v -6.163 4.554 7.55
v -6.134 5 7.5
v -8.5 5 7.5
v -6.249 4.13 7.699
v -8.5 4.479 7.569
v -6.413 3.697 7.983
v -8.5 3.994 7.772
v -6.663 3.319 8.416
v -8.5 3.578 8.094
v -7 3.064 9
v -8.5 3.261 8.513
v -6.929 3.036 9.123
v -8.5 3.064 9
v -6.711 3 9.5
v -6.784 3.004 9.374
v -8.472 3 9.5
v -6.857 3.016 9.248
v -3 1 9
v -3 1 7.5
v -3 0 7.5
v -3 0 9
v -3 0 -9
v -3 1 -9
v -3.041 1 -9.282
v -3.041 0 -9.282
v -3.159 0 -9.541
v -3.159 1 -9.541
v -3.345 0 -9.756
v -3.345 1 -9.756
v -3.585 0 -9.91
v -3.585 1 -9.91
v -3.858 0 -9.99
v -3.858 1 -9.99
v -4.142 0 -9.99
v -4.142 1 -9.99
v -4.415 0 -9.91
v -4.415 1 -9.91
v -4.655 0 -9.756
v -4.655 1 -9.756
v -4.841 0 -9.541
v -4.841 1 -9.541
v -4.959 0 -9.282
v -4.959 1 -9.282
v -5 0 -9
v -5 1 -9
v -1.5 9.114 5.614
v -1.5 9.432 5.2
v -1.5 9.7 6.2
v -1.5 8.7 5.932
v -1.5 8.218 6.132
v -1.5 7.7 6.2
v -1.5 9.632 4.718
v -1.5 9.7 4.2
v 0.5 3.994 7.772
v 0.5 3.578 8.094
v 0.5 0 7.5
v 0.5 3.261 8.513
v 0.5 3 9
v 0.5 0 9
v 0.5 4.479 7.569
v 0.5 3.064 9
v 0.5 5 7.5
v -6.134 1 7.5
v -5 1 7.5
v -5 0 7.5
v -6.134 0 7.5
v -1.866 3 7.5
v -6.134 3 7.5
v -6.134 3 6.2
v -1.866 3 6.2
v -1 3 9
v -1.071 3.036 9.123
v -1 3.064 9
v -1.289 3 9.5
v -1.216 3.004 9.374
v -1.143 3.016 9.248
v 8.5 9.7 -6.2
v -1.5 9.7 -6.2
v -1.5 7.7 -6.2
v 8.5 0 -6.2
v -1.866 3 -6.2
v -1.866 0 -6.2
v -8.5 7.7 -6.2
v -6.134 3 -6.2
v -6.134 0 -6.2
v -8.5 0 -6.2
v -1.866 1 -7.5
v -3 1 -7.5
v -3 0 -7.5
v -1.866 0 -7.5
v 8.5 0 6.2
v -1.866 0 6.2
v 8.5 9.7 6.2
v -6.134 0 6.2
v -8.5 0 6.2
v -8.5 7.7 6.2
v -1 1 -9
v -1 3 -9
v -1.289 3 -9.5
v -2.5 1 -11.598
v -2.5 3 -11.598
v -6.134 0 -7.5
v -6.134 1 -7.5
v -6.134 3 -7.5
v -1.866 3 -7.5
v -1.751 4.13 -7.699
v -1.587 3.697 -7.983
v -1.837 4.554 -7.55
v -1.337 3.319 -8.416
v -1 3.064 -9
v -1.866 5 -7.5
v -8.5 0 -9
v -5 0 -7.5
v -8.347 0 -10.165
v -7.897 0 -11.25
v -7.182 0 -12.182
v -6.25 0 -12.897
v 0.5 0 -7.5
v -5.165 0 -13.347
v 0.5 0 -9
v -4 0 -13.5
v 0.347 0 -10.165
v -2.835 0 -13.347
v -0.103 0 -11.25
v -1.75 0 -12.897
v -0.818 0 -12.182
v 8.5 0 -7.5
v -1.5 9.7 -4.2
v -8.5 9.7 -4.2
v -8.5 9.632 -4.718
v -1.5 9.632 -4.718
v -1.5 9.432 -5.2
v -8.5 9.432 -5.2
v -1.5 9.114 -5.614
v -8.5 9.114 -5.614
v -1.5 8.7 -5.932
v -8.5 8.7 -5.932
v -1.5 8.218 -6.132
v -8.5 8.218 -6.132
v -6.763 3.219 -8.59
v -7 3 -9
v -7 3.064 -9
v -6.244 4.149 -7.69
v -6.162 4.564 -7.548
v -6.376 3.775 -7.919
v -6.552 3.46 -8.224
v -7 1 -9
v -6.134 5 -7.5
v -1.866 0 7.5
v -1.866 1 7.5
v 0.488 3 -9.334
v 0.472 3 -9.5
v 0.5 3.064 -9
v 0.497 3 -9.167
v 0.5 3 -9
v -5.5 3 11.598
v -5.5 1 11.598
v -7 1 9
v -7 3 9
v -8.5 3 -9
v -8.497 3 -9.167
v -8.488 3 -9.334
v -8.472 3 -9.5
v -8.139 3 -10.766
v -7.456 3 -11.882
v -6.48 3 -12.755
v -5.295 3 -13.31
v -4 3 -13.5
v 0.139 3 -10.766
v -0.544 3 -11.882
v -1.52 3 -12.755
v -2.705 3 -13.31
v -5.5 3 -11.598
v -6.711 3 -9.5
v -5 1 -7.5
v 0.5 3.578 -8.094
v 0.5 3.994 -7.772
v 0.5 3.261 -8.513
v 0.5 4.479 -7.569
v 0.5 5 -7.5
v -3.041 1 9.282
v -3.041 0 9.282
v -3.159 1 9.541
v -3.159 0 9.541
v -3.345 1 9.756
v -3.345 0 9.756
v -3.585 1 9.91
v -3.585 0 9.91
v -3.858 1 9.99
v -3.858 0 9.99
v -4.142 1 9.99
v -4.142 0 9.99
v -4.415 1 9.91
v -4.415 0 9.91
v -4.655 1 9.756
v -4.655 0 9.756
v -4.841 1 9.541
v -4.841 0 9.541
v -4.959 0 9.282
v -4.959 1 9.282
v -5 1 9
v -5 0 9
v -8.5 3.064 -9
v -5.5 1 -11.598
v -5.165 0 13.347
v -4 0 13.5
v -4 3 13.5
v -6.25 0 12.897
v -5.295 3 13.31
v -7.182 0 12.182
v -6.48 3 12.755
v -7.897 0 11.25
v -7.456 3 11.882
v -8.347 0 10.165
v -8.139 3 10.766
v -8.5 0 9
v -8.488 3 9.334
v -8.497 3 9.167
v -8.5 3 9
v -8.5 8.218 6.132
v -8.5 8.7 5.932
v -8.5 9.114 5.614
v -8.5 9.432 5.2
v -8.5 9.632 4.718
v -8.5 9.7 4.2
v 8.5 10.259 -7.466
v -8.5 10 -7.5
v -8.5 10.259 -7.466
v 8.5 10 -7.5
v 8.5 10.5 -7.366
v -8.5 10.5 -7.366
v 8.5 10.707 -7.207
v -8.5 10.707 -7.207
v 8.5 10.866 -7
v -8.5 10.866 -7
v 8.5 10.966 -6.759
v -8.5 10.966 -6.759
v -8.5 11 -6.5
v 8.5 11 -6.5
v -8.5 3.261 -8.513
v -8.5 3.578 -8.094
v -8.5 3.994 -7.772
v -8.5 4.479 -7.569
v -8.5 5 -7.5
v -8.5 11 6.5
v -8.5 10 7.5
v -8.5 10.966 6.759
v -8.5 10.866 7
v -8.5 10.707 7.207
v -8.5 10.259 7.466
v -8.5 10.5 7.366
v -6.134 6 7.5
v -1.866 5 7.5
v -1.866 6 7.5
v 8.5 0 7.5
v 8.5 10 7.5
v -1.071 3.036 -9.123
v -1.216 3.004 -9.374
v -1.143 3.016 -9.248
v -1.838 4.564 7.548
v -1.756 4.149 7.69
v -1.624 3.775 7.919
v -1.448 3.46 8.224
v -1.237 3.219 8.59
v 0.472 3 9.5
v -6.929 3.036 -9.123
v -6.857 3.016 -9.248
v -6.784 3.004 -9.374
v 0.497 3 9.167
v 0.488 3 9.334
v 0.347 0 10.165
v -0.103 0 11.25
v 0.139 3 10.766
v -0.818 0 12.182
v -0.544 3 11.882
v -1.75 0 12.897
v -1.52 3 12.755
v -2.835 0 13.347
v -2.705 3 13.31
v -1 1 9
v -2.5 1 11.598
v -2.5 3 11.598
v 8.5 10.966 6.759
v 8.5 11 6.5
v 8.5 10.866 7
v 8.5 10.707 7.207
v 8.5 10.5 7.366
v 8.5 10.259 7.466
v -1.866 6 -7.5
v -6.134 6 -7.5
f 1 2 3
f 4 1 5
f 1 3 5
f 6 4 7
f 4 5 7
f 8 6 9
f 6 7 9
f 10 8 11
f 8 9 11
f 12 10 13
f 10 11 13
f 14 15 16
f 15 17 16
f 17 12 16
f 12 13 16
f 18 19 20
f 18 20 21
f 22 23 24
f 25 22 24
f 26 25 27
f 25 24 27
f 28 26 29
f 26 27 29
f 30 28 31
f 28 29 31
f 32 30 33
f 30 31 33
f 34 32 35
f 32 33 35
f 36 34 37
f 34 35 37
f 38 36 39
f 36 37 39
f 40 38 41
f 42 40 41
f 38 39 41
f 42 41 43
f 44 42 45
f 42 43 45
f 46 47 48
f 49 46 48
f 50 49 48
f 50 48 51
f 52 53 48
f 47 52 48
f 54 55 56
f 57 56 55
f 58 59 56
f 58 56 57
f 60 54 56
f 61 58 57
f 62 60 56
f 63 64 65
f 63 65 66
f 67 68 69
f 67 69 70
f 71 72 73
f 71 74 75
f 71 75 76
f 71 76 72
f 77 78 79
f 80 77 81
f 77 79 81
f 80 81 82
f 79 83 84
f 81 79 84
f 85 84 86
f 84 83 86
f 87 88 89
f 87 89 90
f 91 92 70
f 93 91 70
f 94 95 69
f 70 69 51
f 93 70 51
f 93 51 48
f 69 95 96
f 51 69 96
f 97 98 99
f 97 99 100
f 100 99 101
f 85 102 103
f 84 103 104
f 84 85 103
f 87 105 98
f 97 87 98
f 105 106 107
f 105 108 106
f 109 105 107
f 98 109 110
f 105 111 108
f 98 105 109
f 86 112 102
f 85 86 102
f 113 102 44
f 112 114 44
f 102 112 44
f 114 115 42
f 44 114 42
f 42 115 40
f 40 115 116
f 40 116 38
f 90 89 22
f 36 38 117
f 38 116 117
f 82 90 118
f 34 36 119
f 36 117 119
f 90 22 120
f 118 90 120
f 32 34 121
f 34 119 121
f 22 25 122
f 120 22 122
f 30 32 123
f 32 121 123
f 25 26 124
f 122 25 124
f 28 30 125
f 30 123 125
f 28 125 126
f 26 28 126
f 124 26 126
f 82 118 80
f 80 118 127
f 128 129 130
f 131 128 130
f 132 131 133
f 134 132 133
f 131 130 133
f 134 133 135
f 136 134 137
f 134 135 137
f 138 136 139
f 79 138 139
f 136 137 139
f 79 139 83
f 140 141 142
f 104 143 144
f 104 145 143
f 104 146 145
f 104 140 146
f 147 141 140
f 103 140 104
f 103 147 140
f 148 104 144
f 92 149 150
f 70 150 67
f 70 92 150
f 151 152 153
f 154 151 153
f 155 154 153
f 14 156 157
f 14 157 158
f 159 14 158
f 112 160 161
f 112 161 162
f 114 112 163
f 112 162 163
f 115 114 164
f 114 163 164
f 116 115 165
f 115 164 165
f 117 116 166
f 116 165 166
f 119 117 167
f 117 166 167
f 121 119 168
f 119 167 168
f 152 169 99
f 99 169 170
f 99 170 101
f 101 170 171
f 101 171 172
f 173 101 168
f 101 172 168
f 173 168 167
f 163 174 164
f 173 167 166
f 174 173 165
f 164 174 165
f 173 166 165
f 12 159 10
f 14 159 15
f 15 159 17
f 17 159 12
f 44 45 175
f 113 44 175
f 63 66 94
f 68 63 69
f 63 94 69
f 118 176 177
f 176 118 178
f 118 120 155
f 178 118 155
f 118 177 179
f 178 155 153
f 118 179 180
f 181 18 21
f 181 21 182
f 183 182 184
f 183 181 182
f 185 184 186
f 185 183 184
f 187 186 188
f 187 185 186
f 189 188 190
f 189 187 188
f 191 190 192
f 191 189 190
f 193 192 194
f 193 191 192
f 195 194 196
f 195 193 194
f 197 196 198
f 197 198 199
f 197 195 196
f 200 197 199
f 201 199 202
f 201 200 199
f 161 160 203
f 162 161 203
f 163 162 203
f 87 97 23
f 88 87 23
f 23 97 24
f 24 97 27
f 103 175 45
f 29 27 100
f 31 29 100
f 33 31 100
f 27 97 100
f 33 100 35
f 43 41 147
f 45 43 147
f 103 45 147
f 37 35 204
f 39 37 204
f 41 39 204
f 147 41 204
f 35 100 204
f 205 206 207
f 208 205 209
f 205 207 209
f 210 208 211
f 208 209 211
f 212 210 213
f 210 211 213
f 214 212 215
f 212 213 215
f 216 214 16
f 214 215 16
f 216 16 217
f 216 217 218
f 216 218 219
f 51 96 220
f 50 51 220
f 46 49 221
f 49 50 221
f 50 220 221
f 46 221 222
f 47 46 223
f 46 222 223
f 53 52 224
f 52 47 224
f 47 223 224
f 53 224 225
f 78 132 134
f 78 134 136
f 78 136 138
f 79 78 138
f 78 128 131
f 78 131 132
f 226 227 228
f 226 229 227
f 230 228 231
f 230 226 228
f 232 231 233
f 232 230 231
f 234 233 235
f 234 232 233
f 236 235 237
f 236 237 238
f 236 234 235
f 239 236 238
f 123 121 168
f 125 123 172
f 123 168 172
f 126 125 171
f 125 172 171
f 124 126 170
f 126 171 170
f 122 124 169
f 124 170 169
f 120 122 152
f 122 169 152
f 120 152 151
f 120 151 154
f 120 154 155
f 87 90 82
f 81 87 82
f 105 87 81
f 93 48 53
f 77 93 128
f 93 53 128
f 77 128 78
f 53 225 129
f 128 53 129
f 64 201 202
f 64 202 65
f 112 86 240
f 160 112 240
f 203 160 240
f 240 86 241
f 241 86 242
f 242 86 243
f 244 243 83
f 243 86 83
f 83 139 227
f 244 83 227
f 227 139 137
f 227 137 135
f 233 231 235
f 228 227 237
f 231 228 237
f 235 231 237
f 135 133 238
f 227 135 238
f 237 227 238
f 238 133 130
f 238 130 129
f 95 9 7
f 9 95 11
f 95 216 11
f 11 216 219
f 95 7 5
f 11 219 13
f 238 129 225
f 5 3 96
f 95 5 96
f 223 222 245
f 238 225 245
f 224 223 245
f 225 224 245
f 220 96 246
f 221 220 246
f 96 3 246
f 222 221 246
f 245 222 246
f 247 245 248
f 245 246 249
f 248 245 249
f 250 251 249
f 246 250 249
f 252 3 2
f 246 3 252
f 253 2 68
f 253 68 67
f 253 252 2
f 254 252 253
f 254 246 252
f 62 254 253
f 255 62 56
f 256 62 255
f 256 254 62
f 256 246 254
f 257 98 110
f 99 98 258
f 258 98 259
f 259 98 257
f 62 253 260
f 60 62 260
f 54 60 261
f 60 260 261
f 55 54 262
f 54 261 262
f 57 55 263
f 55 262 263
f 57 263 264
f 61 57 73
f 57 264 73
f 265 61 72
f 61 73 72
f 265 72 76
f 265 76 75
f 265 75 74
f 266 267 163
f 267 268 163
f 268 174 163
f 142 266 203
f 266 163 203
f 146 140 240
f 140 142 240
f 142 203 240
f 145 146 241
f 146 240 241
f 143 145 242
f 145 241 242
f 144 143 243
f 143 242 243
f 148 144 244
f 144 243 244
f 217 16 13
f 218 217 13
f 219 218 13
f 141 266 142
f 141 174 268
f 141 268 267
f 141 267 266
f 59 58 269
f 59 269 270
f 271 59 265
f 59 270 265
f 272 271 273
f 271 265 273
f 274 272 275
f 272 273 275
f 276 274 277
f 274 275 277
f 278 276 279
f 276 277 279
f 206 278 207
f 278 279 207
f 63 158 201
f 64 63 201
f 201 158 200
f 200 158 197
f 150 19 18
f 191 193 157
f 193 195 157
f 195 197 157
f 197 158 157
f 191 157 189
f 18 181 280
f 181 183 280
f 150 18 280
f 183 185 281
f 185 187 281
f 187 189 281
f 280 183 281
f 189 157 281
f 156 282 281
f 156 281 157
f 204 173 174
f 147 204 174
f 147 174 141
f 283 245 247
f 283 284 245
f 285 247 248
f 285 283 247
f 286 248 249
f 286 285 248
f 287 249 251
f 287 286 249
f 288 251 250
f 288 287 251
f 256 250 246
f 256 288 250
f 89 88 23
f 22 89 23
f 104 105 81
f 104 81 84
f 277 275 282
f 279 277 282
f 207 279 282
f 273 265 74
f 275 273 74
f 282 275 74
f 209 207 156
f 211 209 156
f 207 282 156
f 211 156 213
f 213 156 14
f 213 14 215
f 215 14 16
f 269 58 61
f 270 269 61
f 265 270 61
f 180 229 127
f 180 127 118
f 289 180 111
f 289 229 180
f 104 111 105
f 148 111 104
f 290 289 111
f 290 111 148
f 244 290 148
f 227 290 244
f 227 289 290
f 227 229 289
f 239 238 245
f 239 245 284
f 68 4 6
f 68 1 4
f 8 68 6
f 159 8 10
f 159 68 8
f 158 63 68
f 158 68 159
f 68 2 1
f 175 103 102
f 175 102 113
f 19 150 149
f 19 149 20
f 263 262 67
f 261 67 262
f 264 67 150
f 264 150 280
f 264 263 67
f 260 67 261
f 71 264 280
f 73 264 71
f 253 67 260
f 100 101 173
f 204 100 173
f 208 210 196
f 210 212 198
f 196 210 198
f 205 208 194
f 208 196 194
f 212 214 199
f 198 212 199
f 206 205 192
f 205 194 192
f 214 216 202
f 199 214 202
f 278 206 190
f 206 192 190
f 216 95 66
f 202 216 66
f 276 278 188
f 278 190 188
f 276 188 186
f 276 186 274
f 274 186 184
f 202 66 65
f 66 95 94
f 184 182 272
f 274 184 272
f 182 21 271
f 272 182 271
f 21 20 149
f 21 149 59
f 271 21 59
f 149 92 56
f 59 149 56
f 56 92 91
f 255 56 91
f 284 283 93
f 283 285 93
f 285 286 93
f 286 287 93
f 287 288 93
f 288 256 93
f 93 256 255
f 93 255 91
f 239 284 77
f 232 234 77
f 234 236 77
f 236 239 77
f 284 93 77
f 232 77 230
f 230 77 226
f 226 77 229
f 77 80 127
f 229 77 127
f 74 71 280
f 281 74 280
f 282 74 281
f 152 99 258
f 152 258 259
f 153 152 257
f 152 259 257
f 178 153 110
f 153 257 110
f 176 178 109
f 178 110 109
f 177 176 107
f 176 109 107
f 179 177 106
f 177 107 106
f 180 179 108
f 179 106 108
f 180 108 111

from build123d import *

# Parameters (mm, degrees)
CROQUIS1_W              = 17
CROQUIS1_H              = 27
SALIENTE_EXTRUIR1_DEPTH = 11
CROQUIS2_W              = 17
CROQUIS2_H              = 6
CORTAR_EXTRUIR1_DEPTH   = 6
CROQUIS3_W              = 8
CROQUIS3_H              = 5
CORTAR_EXTRUIR2_DEPTH   = 6
CROQUIS4_W              = 8
CROQUIS4_H              = 5
CORTAR_EXTRUIR3_DEPTH   = 6
CORTAR_EXTRUIR8_DEPTH   = 6
CORTAR_EXTRUIR16_DEPTH  = 2
CORTAR_EXTRUIR17_DEPTH  = 2
CORTAR_EXTRUIR18_DEPTH  = 2
REDONDEO5_START         = -1
REDONDEO5_DEPTH         = 1.04658
REDONDEO5_START_2       = -7.65058
REDONDEO5_2_DEPTH       = 0.804
REDONDEO5_START_3       = -1.866025504
REDONDEO5_3_DEPTH       = 2.366025504
REDONDEO5_START_4       = -8.5
REDONDEO5_4_DEPTH       = 0.84942
REDONDEO5_START_5       = -6.84658
REDONDEO5_5_DEPTH       = 0.712605404
REDONDEO5_START_6       = 3
REDONDEO5_6_DEPTH       = 3
CORTAR_EXTRUIR19_DEPTH  = 17
CORTAR_EXTRUIR20_START  = -10
CORTAR_EXTRUIR20_DEPTH  = 10
REDONDEO6_R             = 1
CORTAR_EXTRUIR21_DEPTH  = 1
CORTAR_EXTRUIR22_DEPTH  = 1
CORTAR_EXTRUIR26_DEPTH  = 1.3
CROQUIS17_W             = 4.267949192
CROQUIS17_H             = 2
CORTAR_EXTRUIR27_DEPTH  = 1.3
CROQUIS19_W             = 4.267949192
CROQUIS19_H             = 1
CORTAR_EXTRUIR28_DEPTH  = 1.3
CROQUIS20_W             = 4.267949192
CROQUIS20_H             = 1
CORTAR_EXTRUIR29_DEPTH  = 1.3


with BuildPart() as part:
    # Croquis1 → Saliente-Extruir1 (new body)
    with BuildSketch(Plane(origin=(0, 0, 0), x_dir=(1, 0, 0), z_dir=(0, 1, 0))):
        Rectangle(CROQUIS1_W, CROQUIS1_H)
    extrude(amount=SALIENTE_EXTRUIR1_DEPTH)

    # Croquis2 → Cortar-Extruir1 (cut)
    with BuildSketch(Plane(origin=(0, 11, 0), x_dir=(1, 0, 0), z_dir=(0, 1, 0))):
        with Locations((0, 10.5)):
            Rectangle(CROQUIS2_W, CROQUIS2_H)
        with Locations((0, -10.5)):
            Rectangle(CROQUIS2_W, CROQUIS2_H)
    extrude(amount=-CORTAR_EXTRUIR1_DEPTH, mode=Mode.SUBTRACT)

    # Croquis3 → Cortar-Extruir2 (cut)
    with BuildSketch(Plane.XY.offset(13.5)):
        with Locations((4.5, 2.5)):
            Rectangle(CROQUIS3_W, CROQUIS3_H)
    extrude(amount=-CORTAR_EXTRUIR2_DEPTH, mode=Mode.SUBTRACT)

    # Croquis4 → Cortar-Extruir3 (cut)
    with BuildSketch(Plane(origin=(0, 0, -13.5), x_dir=(-1, 0, 0), z_dir=(0, 0, -1))):
        with Locations((-4.5, 2.5)):
            Rectangle(CROQUIS4_W, CROQUIS4_H)
    extrude(amount=-CORTAR_EXTRUIR3_DEPTH, mode=Mode.SUBTRACT)

    # Croquis5 → Cortar-Extruir8 (cut)
    with BuildSketch(Plane(origin=(0, 5, 0), x_dir=(1, 0, 0), z_dir=(0, 1, 0))):
        with BuildLine():
            Line((-8.5, 13.5), (-8.5, 9))
            ThreePointArc((-8.5, 9), (-7.181980515, 12.181980515), (-4, 13.5))
            Line((-4, 13.5), (-8.5, 13.5))
        make_face()
        with BuildLine():
            Line((0.5, 13.5), (-4, 13.5))
            ThreePointArc((-4, 13.5), (-0.818019485, 12.181980515), (0.5, 9))
            Line((0.5, 9), (0.5, 13.5))
        make_face()
        with BuildLine():
            ThreePointArc((-4, -13.5), (-7.181980515, -12.181980515), (-8.5, -9))
            Line((-8.5, -9), (-8.5, -13.5))
            Line((-8.5, -13.5), (-4, -13.5))
        make_face()
        with BuildLine():
            ThreePointArc((0.5, -9), (-0.818019485, -12.181980515), (-4, -13.5))
            Line((-4, -13.5), (0.5, -13.5))
            Line((0.5, -13.5), (0.5, -9))
        make_face()
    extrude(amount=-CORTAR_EXTRUIR8_DEPTH, mode=Mode.SUBTRACT)

    # Croquis7 → Cortar-Extruir16 (cut)
    with BuildSketch(Plane(origin=(0, 5, 0), x_dir=(1, 0, 0), z_dir=(0, 1, 0))):
        with BuildLine():
            Line((-8.5, 7.5), (-8.5, 9))
            ThreePointArc((-8.5, 9), (-4, 13.5), (0.5, 9))
            Line((0.5, 9), (0.5, 7.5))
            Line((0.5, 7.5), (-8.5, 7.5))
        make_face()
        with BuildLine():
            Line((-8.5, -9), (-8.5, -7.5))
            Line((-8.5, -7.5), (0.5, -7.5))
            Line((0.5, -7.5), (0.5, -9))
            ThreePointArc((0.5, -9), (-4, -13.5), (-8.5, -9))
        make_face()
    extrude(amount=-CORTAR_EXTRUIR16_DEPTH, mode=Mode.SUBTRACT)

    # Croquis10 → Cortar-Extruir17 (cut)
    with BuildSketch(Plane(origin=(0, 3, 0), x_dir=(1, 0, 0), z_dir=(0, 1, 0))):
        Polygon((-6.133974596, 7.5), (-1.866025404, 7.5), (-1, 9), (-2.5, 11.598076211), (-5.5, 11.598076211), (-7, 9), align=None)
    extrude(amount=-CORTAR_EXTRUIR17_DEPTH, mode=Mode.SUBTRACT)

    # Croquis11 → Cortar-Extruir18 (cut)
    with BuildSketch(Plane(origin=(0, 3, 0), x_dir=(1, 0, 0), z_dir=(0, 1, 0))):
        Polygon((-6.133974596, -7.5), (-1.866025404, -7.5), (-1, -9), (-2.5, -11.598076211), (-5.5, -11.598076211), (-7, -9), align=None)
    extrude(amount=-CORTAR_EXTRUIR18_DEPTH, mode=Mode.SUBTRACT)

    # Redondeo5: read off the stored shape, not the designer's step
    # Redondeo5 outline → Redondeo5 (add)
    with BuildSketch(Plane.YZ.offset(REDONDEO5_START)):
        with BuildLine():
            Line((3, 7.5), (5, 7.5))
            ThreePointArc((5, 7.5), (3.585786438, 8.085786438), (3, 9.5))
            Line((3, 9.5), (3, 7.5))
        make_face()
        with BuildLine():
            ThreePointArc((3, -9.5), (3.585786438, -8.085786438), (5, -7.5))
            Line((5, -7.5), (3, -7.5))
            Line((3, -7.5), (3, -9.5))
        make_face()
    extrude(amount=REDONDEO5_DEPTH)

    # Redondeo5 2 outline → Redondeo5 2 (add)
    with BuildSketch(Plane.YZ.offset(REDONDEO5_START_2)):
        with BuildLine():
            Line((3, 7.5), (5, 7.5))
            ThreePointArc((5, 7.5), (3.585786438, 8.085786438), (3, 9.5))
            Line((3, 9.5), (3, 7.5))
        make_face()
        with BuildLine():
            ThreePointArc((3, -9.5), (3.585786438, -8.085786438), (5, -7.5))
            Line((5, -7.5), (3, -7.5))
            Line((3, -7.5), (3, -9.5))
        make_face()
    extrude(amount=REDONDEO5_2_DEPTH)

    # Redondeo5 3 outline → Redondeo5 3 (add)
    with BuildSketch(Plane.YZ.offset(REDONDEO5_START_3)):
        with BuildLine():
            Line((3, 7.5), (5, 7.5))
            ThreePointArc((5, 7.5), (3.585786438, 8.085786438), (3, 9.5))
            Line((3, 9.5), (3, 7.5))
        make_face()
        with BuildLine():
            ThreePointArc((3, -9.5), (3.585786438, -8.085786438), (5, -7.5))
            Line((5, -7.5), (3, -7.5))
            Line((3, -7.5), (3, -9.5))
        make_face()
    extrude(amount=REDONDEO5_3_DEPTH)

    # Redondeo5 4 outline → Redondeo5 4 (add)
    with BuildSketch(Plane.YZ.offset(REDONDEO5_START_4)):
        with BuildLine():
            Line((3, 7.5), (5, 7.5))
            ThreePointArc((5, 7.5), (3.585786438, 8.085786438), (3, 9.5))
            Line((3, 9.5), (3, 7.5))
        make_face()
        with BuildLine():
            ThreePointArc((3, -9.5), (3.585786438, -8.085786438), (5, -7.5))
            Line((5, -7.5), (3, -7.5))
            Line((3, -7.5), (3, -9.5))
        make_face()
    extrude(amount=REDONDEO5_4_DEPTH)

    # Redondeo5 5 outline → Redondeo5 5 (add)
    with BuildSketch(Plane.YZ.offset(REDONDEO5_START_5)):
        with BuildLine():
            Line((3, 7.5), (5, 7.5))
            ThreePointArc((5, 7.5), (3.585786438, 8.085786438), (3, 9.5))
            Line((3, 9.5), (3, 7.5))
        make_face()
        with BuildLine():
            ThreePointArc((3, -9.5), (3.585786438, -8.085786438), (5, -7.5))
            Line((5, -7.5), (3, -7.5))
            Line((3, -7.5), (3, -9.5))
        make_face()
    extrude(amount=REDONDEO5_5_DEPTH)

    # Redondeo5 6 outline → Redondeo5 6 (cut)
    with BuildSketch(Plane(origin=(0, 0, 0), x_dir=(1, 0, 0), z_dir=(0, 1, 0)).offset(REDONDEO5_START_6)):
        with BuildLine():
            ThreePointArc((0.472135955, 9.5), (0.493028589, 9.250387902), (0.5, 9))
            Line((0.5, 9), (0.5, 9.5))
            Line((0.5, 9.5), (0.472135955, 9.5))
        make_face()
        Polygon((-7, 9), (-6.133974596, 7.5), (-6.133974596, 9.5), (-6.711324865, 9.5), align=None)
        Polygon((-1.866025504, 9.5), (-1.866025504, 7.5), (-1, 9), (-1.288675135, 9.5), align=None)
        with BuildLine():
            Line((-8.5, 9.5), (-8.5, 9))
            ThreePointArc((-8.5, 9), (-8.493028589, 9.250387902), (-8.472135955, 9.5))
            Line((-8.472135955, 9.5), (-8.5, 9.5))
        make_face()
        with BuildLine():
            Line((-8.5, -9), (-8.5, -9.5))
            Line((-8.5, -9.5), (-8.472135955, -9.5))
            ThreePointArc((-8.472135955, -9.5), (-8.493028589, -9.250387902), (-8.5, -9))
        make_face()
        Polygon((-1.866025504, -9.5), (-1.288675135, -9.5), (-1, -9), (-1.866025404, -7.5), align=None)
        Polygon((-6.711324865, -9.5), (-6.133974596, -9.5), (-6.133974596, -7.5), (-7, -9), align=None)
        with BuildLine():
            ThreePointArc((0.5, -9), (0.493028589, -9.250387902), (0.472135955, -9.5))
            Line((0.472135955, -9.5), (0.5, -9.5))
            Line((0.5, -9.5), (0.5, -9))
        make_face()
    extrude(amount=REDONDEO5_6_DEPTH, mode=Mode.SUBTRACT)

    # Croquis12 → Cortar-Extruir19 (cut)
    with BuildSketch(Plane.ZY.offset(8.5)):
        with BuildLine():
            Line((-6.2, 0), (6.2, 0))
            Line((6.2, 0), (6.2, 7.7))
            ThreePointArc((6.2, 7.7), (5.614213562, 9.114213562), (4.2, 9.7))
            Line((4.2, 9.7), (-4.2, 9.7))
            ThreePointArc((-4.2, 9.7), (-5.614213562, 9.114213562), (-6.2, 7.7))
            Line((-6.2, 7.7), (-6.2, 0))
        make_face()
    extrude(amount=-CORTAR_EXTRUIR19_DEPTH, mode=Mode.SUBTRACT)

    # Croquis13 → Cortar-Extruir20 (cut)
    with BuildSketch(Plane(origin=(8.5, 0, 0), x_dir=(0, 0, -1), z_dir=(1, 0, 0)).offset(CORTAR_EXTRUIR20_START)):
        with BuildLine():
            Line((-6.2, 7.7), (-6.2, 9.7))
            Line((-6.2, 9.7), (-4.2, 9.7))
            ThreePointArc((-4.2, 9.7), (-5.614213562, 9.114213562), (-6.2, 7.7))
        make_face()
        with BuildLine():
            Line((6.2, 7.7), (6.2, 9.7))
            Line((6.2, 9.7), (4.2, 9.7))
            ThreePointArc((4.2, 9.7), (5.614213562, 9.114213562), (6.2, 7.7))
        make_face()
    extrude(amount=CORTAR_EXTRUIR20_DEPTH, mode=Mode.SUBTRACT)

    # Redondeo6
    redondeo6_edges = [part.edges().sort_by_distance(p)[0] for p in [
        (0, 11, -7.5),
        (0, 11, 7.5),
    ]]
    fillet(redondeo6_edges, radius=REDONDEO6_R)

    # Croquis14 → Cortar-Extruir21 (cut)
    with BuildSketch(Plane(origin=(0, 1, 0), x_dir=(1, 0, 0), z_dir=(0, 1, 0))):
        with BuildLine():
            Line((-5, 9), (-5, 7.5))
            Line((-5, 7.5), (-3, 7.5))
            Line((-3, 7.5), (-3, 9))
            ThreePointArc((-3, 9), (-4, 10), (-5, 9))
        make_face()
    extrude(amount=-CORTAR_EXTRUIR21_DEPTH, mode=Mode.SUBTRACT)

    # Croquis15 → Cortar-Extruir22 (cut)
    with BuildSketch(Plane(origin=(0, 1, 0), x_dir=(1, 0, 0), z_dir=(0, 1, 0))):
        with BuildLine():
            Line((-5, -9), (-5, -7.5))
            Line((-5, -7.5), (-3, -7.5))
            Line((-3, -7.5), (-3, -9))
            ThreePointArc((-3, -9), (-4, -10), (-5, -9))
        make_face()
    extrude(amount=-CORTAR_EXTRUIR22_DEPTH, mode=Mode.SUBTRACT)

    # Croquis16 → Cortar-Extruir26 (cut)
    with BuildSketch(Plane(origin=(0, 0, -7.5), x_dir=(-1, 0, 0), z_dir=(0, 0, -1))):
        Polygon((1.866025404, 3), (6.133974596, 3), (6.133974596, 1), (5, 1), (3, 1), (1.866025404, 1), align=None)
    extrude(amount=-CORTAR_EXTRUIR26_DEPTH, mode=Mode.SUBTRACT)

    # Croquis17 → Cortar-Extruir27 (cut)
    with BuildSketch(Plane.XY.offset(7.5)):
        with Locations((-4, 2)):
            Rectangle(CROQUIS17_W, CROQUIS17_H)
    extrude(amount=-CORTAR_EXTRUIR27_DEPTH, mode=Mode.SUBTRACT)

    # Croquis19 → Cortar-Extruir28 (cut)
    with BuildSketch(Plane(origin=(0, 0, 6.2), x_dir=(-1, 0, 0), z_dir=(0, 0, -1))):
        with Locations((4, 0.5)):
            Rectangle(CROQUIS19_W, CROQUIS19_H)
    extrude(amount=-CORTAR_EXTRUIR28_DEPTH, mode=Mode.SUBTRACT)

    # Croquis20 → Cortar-Extruir29 (cut)
    with BuildSketch(Plane.XY.offset(-6.2)):
        with Locations((-4, 0.5)):
            Rectangle(CROQUIS20_W, CROQUIS20_H)
    extrude(amount=-CORTAR_EXTRUIR29_DEPTH, mode=Mode.SUBTRACT)


solid = part.part
